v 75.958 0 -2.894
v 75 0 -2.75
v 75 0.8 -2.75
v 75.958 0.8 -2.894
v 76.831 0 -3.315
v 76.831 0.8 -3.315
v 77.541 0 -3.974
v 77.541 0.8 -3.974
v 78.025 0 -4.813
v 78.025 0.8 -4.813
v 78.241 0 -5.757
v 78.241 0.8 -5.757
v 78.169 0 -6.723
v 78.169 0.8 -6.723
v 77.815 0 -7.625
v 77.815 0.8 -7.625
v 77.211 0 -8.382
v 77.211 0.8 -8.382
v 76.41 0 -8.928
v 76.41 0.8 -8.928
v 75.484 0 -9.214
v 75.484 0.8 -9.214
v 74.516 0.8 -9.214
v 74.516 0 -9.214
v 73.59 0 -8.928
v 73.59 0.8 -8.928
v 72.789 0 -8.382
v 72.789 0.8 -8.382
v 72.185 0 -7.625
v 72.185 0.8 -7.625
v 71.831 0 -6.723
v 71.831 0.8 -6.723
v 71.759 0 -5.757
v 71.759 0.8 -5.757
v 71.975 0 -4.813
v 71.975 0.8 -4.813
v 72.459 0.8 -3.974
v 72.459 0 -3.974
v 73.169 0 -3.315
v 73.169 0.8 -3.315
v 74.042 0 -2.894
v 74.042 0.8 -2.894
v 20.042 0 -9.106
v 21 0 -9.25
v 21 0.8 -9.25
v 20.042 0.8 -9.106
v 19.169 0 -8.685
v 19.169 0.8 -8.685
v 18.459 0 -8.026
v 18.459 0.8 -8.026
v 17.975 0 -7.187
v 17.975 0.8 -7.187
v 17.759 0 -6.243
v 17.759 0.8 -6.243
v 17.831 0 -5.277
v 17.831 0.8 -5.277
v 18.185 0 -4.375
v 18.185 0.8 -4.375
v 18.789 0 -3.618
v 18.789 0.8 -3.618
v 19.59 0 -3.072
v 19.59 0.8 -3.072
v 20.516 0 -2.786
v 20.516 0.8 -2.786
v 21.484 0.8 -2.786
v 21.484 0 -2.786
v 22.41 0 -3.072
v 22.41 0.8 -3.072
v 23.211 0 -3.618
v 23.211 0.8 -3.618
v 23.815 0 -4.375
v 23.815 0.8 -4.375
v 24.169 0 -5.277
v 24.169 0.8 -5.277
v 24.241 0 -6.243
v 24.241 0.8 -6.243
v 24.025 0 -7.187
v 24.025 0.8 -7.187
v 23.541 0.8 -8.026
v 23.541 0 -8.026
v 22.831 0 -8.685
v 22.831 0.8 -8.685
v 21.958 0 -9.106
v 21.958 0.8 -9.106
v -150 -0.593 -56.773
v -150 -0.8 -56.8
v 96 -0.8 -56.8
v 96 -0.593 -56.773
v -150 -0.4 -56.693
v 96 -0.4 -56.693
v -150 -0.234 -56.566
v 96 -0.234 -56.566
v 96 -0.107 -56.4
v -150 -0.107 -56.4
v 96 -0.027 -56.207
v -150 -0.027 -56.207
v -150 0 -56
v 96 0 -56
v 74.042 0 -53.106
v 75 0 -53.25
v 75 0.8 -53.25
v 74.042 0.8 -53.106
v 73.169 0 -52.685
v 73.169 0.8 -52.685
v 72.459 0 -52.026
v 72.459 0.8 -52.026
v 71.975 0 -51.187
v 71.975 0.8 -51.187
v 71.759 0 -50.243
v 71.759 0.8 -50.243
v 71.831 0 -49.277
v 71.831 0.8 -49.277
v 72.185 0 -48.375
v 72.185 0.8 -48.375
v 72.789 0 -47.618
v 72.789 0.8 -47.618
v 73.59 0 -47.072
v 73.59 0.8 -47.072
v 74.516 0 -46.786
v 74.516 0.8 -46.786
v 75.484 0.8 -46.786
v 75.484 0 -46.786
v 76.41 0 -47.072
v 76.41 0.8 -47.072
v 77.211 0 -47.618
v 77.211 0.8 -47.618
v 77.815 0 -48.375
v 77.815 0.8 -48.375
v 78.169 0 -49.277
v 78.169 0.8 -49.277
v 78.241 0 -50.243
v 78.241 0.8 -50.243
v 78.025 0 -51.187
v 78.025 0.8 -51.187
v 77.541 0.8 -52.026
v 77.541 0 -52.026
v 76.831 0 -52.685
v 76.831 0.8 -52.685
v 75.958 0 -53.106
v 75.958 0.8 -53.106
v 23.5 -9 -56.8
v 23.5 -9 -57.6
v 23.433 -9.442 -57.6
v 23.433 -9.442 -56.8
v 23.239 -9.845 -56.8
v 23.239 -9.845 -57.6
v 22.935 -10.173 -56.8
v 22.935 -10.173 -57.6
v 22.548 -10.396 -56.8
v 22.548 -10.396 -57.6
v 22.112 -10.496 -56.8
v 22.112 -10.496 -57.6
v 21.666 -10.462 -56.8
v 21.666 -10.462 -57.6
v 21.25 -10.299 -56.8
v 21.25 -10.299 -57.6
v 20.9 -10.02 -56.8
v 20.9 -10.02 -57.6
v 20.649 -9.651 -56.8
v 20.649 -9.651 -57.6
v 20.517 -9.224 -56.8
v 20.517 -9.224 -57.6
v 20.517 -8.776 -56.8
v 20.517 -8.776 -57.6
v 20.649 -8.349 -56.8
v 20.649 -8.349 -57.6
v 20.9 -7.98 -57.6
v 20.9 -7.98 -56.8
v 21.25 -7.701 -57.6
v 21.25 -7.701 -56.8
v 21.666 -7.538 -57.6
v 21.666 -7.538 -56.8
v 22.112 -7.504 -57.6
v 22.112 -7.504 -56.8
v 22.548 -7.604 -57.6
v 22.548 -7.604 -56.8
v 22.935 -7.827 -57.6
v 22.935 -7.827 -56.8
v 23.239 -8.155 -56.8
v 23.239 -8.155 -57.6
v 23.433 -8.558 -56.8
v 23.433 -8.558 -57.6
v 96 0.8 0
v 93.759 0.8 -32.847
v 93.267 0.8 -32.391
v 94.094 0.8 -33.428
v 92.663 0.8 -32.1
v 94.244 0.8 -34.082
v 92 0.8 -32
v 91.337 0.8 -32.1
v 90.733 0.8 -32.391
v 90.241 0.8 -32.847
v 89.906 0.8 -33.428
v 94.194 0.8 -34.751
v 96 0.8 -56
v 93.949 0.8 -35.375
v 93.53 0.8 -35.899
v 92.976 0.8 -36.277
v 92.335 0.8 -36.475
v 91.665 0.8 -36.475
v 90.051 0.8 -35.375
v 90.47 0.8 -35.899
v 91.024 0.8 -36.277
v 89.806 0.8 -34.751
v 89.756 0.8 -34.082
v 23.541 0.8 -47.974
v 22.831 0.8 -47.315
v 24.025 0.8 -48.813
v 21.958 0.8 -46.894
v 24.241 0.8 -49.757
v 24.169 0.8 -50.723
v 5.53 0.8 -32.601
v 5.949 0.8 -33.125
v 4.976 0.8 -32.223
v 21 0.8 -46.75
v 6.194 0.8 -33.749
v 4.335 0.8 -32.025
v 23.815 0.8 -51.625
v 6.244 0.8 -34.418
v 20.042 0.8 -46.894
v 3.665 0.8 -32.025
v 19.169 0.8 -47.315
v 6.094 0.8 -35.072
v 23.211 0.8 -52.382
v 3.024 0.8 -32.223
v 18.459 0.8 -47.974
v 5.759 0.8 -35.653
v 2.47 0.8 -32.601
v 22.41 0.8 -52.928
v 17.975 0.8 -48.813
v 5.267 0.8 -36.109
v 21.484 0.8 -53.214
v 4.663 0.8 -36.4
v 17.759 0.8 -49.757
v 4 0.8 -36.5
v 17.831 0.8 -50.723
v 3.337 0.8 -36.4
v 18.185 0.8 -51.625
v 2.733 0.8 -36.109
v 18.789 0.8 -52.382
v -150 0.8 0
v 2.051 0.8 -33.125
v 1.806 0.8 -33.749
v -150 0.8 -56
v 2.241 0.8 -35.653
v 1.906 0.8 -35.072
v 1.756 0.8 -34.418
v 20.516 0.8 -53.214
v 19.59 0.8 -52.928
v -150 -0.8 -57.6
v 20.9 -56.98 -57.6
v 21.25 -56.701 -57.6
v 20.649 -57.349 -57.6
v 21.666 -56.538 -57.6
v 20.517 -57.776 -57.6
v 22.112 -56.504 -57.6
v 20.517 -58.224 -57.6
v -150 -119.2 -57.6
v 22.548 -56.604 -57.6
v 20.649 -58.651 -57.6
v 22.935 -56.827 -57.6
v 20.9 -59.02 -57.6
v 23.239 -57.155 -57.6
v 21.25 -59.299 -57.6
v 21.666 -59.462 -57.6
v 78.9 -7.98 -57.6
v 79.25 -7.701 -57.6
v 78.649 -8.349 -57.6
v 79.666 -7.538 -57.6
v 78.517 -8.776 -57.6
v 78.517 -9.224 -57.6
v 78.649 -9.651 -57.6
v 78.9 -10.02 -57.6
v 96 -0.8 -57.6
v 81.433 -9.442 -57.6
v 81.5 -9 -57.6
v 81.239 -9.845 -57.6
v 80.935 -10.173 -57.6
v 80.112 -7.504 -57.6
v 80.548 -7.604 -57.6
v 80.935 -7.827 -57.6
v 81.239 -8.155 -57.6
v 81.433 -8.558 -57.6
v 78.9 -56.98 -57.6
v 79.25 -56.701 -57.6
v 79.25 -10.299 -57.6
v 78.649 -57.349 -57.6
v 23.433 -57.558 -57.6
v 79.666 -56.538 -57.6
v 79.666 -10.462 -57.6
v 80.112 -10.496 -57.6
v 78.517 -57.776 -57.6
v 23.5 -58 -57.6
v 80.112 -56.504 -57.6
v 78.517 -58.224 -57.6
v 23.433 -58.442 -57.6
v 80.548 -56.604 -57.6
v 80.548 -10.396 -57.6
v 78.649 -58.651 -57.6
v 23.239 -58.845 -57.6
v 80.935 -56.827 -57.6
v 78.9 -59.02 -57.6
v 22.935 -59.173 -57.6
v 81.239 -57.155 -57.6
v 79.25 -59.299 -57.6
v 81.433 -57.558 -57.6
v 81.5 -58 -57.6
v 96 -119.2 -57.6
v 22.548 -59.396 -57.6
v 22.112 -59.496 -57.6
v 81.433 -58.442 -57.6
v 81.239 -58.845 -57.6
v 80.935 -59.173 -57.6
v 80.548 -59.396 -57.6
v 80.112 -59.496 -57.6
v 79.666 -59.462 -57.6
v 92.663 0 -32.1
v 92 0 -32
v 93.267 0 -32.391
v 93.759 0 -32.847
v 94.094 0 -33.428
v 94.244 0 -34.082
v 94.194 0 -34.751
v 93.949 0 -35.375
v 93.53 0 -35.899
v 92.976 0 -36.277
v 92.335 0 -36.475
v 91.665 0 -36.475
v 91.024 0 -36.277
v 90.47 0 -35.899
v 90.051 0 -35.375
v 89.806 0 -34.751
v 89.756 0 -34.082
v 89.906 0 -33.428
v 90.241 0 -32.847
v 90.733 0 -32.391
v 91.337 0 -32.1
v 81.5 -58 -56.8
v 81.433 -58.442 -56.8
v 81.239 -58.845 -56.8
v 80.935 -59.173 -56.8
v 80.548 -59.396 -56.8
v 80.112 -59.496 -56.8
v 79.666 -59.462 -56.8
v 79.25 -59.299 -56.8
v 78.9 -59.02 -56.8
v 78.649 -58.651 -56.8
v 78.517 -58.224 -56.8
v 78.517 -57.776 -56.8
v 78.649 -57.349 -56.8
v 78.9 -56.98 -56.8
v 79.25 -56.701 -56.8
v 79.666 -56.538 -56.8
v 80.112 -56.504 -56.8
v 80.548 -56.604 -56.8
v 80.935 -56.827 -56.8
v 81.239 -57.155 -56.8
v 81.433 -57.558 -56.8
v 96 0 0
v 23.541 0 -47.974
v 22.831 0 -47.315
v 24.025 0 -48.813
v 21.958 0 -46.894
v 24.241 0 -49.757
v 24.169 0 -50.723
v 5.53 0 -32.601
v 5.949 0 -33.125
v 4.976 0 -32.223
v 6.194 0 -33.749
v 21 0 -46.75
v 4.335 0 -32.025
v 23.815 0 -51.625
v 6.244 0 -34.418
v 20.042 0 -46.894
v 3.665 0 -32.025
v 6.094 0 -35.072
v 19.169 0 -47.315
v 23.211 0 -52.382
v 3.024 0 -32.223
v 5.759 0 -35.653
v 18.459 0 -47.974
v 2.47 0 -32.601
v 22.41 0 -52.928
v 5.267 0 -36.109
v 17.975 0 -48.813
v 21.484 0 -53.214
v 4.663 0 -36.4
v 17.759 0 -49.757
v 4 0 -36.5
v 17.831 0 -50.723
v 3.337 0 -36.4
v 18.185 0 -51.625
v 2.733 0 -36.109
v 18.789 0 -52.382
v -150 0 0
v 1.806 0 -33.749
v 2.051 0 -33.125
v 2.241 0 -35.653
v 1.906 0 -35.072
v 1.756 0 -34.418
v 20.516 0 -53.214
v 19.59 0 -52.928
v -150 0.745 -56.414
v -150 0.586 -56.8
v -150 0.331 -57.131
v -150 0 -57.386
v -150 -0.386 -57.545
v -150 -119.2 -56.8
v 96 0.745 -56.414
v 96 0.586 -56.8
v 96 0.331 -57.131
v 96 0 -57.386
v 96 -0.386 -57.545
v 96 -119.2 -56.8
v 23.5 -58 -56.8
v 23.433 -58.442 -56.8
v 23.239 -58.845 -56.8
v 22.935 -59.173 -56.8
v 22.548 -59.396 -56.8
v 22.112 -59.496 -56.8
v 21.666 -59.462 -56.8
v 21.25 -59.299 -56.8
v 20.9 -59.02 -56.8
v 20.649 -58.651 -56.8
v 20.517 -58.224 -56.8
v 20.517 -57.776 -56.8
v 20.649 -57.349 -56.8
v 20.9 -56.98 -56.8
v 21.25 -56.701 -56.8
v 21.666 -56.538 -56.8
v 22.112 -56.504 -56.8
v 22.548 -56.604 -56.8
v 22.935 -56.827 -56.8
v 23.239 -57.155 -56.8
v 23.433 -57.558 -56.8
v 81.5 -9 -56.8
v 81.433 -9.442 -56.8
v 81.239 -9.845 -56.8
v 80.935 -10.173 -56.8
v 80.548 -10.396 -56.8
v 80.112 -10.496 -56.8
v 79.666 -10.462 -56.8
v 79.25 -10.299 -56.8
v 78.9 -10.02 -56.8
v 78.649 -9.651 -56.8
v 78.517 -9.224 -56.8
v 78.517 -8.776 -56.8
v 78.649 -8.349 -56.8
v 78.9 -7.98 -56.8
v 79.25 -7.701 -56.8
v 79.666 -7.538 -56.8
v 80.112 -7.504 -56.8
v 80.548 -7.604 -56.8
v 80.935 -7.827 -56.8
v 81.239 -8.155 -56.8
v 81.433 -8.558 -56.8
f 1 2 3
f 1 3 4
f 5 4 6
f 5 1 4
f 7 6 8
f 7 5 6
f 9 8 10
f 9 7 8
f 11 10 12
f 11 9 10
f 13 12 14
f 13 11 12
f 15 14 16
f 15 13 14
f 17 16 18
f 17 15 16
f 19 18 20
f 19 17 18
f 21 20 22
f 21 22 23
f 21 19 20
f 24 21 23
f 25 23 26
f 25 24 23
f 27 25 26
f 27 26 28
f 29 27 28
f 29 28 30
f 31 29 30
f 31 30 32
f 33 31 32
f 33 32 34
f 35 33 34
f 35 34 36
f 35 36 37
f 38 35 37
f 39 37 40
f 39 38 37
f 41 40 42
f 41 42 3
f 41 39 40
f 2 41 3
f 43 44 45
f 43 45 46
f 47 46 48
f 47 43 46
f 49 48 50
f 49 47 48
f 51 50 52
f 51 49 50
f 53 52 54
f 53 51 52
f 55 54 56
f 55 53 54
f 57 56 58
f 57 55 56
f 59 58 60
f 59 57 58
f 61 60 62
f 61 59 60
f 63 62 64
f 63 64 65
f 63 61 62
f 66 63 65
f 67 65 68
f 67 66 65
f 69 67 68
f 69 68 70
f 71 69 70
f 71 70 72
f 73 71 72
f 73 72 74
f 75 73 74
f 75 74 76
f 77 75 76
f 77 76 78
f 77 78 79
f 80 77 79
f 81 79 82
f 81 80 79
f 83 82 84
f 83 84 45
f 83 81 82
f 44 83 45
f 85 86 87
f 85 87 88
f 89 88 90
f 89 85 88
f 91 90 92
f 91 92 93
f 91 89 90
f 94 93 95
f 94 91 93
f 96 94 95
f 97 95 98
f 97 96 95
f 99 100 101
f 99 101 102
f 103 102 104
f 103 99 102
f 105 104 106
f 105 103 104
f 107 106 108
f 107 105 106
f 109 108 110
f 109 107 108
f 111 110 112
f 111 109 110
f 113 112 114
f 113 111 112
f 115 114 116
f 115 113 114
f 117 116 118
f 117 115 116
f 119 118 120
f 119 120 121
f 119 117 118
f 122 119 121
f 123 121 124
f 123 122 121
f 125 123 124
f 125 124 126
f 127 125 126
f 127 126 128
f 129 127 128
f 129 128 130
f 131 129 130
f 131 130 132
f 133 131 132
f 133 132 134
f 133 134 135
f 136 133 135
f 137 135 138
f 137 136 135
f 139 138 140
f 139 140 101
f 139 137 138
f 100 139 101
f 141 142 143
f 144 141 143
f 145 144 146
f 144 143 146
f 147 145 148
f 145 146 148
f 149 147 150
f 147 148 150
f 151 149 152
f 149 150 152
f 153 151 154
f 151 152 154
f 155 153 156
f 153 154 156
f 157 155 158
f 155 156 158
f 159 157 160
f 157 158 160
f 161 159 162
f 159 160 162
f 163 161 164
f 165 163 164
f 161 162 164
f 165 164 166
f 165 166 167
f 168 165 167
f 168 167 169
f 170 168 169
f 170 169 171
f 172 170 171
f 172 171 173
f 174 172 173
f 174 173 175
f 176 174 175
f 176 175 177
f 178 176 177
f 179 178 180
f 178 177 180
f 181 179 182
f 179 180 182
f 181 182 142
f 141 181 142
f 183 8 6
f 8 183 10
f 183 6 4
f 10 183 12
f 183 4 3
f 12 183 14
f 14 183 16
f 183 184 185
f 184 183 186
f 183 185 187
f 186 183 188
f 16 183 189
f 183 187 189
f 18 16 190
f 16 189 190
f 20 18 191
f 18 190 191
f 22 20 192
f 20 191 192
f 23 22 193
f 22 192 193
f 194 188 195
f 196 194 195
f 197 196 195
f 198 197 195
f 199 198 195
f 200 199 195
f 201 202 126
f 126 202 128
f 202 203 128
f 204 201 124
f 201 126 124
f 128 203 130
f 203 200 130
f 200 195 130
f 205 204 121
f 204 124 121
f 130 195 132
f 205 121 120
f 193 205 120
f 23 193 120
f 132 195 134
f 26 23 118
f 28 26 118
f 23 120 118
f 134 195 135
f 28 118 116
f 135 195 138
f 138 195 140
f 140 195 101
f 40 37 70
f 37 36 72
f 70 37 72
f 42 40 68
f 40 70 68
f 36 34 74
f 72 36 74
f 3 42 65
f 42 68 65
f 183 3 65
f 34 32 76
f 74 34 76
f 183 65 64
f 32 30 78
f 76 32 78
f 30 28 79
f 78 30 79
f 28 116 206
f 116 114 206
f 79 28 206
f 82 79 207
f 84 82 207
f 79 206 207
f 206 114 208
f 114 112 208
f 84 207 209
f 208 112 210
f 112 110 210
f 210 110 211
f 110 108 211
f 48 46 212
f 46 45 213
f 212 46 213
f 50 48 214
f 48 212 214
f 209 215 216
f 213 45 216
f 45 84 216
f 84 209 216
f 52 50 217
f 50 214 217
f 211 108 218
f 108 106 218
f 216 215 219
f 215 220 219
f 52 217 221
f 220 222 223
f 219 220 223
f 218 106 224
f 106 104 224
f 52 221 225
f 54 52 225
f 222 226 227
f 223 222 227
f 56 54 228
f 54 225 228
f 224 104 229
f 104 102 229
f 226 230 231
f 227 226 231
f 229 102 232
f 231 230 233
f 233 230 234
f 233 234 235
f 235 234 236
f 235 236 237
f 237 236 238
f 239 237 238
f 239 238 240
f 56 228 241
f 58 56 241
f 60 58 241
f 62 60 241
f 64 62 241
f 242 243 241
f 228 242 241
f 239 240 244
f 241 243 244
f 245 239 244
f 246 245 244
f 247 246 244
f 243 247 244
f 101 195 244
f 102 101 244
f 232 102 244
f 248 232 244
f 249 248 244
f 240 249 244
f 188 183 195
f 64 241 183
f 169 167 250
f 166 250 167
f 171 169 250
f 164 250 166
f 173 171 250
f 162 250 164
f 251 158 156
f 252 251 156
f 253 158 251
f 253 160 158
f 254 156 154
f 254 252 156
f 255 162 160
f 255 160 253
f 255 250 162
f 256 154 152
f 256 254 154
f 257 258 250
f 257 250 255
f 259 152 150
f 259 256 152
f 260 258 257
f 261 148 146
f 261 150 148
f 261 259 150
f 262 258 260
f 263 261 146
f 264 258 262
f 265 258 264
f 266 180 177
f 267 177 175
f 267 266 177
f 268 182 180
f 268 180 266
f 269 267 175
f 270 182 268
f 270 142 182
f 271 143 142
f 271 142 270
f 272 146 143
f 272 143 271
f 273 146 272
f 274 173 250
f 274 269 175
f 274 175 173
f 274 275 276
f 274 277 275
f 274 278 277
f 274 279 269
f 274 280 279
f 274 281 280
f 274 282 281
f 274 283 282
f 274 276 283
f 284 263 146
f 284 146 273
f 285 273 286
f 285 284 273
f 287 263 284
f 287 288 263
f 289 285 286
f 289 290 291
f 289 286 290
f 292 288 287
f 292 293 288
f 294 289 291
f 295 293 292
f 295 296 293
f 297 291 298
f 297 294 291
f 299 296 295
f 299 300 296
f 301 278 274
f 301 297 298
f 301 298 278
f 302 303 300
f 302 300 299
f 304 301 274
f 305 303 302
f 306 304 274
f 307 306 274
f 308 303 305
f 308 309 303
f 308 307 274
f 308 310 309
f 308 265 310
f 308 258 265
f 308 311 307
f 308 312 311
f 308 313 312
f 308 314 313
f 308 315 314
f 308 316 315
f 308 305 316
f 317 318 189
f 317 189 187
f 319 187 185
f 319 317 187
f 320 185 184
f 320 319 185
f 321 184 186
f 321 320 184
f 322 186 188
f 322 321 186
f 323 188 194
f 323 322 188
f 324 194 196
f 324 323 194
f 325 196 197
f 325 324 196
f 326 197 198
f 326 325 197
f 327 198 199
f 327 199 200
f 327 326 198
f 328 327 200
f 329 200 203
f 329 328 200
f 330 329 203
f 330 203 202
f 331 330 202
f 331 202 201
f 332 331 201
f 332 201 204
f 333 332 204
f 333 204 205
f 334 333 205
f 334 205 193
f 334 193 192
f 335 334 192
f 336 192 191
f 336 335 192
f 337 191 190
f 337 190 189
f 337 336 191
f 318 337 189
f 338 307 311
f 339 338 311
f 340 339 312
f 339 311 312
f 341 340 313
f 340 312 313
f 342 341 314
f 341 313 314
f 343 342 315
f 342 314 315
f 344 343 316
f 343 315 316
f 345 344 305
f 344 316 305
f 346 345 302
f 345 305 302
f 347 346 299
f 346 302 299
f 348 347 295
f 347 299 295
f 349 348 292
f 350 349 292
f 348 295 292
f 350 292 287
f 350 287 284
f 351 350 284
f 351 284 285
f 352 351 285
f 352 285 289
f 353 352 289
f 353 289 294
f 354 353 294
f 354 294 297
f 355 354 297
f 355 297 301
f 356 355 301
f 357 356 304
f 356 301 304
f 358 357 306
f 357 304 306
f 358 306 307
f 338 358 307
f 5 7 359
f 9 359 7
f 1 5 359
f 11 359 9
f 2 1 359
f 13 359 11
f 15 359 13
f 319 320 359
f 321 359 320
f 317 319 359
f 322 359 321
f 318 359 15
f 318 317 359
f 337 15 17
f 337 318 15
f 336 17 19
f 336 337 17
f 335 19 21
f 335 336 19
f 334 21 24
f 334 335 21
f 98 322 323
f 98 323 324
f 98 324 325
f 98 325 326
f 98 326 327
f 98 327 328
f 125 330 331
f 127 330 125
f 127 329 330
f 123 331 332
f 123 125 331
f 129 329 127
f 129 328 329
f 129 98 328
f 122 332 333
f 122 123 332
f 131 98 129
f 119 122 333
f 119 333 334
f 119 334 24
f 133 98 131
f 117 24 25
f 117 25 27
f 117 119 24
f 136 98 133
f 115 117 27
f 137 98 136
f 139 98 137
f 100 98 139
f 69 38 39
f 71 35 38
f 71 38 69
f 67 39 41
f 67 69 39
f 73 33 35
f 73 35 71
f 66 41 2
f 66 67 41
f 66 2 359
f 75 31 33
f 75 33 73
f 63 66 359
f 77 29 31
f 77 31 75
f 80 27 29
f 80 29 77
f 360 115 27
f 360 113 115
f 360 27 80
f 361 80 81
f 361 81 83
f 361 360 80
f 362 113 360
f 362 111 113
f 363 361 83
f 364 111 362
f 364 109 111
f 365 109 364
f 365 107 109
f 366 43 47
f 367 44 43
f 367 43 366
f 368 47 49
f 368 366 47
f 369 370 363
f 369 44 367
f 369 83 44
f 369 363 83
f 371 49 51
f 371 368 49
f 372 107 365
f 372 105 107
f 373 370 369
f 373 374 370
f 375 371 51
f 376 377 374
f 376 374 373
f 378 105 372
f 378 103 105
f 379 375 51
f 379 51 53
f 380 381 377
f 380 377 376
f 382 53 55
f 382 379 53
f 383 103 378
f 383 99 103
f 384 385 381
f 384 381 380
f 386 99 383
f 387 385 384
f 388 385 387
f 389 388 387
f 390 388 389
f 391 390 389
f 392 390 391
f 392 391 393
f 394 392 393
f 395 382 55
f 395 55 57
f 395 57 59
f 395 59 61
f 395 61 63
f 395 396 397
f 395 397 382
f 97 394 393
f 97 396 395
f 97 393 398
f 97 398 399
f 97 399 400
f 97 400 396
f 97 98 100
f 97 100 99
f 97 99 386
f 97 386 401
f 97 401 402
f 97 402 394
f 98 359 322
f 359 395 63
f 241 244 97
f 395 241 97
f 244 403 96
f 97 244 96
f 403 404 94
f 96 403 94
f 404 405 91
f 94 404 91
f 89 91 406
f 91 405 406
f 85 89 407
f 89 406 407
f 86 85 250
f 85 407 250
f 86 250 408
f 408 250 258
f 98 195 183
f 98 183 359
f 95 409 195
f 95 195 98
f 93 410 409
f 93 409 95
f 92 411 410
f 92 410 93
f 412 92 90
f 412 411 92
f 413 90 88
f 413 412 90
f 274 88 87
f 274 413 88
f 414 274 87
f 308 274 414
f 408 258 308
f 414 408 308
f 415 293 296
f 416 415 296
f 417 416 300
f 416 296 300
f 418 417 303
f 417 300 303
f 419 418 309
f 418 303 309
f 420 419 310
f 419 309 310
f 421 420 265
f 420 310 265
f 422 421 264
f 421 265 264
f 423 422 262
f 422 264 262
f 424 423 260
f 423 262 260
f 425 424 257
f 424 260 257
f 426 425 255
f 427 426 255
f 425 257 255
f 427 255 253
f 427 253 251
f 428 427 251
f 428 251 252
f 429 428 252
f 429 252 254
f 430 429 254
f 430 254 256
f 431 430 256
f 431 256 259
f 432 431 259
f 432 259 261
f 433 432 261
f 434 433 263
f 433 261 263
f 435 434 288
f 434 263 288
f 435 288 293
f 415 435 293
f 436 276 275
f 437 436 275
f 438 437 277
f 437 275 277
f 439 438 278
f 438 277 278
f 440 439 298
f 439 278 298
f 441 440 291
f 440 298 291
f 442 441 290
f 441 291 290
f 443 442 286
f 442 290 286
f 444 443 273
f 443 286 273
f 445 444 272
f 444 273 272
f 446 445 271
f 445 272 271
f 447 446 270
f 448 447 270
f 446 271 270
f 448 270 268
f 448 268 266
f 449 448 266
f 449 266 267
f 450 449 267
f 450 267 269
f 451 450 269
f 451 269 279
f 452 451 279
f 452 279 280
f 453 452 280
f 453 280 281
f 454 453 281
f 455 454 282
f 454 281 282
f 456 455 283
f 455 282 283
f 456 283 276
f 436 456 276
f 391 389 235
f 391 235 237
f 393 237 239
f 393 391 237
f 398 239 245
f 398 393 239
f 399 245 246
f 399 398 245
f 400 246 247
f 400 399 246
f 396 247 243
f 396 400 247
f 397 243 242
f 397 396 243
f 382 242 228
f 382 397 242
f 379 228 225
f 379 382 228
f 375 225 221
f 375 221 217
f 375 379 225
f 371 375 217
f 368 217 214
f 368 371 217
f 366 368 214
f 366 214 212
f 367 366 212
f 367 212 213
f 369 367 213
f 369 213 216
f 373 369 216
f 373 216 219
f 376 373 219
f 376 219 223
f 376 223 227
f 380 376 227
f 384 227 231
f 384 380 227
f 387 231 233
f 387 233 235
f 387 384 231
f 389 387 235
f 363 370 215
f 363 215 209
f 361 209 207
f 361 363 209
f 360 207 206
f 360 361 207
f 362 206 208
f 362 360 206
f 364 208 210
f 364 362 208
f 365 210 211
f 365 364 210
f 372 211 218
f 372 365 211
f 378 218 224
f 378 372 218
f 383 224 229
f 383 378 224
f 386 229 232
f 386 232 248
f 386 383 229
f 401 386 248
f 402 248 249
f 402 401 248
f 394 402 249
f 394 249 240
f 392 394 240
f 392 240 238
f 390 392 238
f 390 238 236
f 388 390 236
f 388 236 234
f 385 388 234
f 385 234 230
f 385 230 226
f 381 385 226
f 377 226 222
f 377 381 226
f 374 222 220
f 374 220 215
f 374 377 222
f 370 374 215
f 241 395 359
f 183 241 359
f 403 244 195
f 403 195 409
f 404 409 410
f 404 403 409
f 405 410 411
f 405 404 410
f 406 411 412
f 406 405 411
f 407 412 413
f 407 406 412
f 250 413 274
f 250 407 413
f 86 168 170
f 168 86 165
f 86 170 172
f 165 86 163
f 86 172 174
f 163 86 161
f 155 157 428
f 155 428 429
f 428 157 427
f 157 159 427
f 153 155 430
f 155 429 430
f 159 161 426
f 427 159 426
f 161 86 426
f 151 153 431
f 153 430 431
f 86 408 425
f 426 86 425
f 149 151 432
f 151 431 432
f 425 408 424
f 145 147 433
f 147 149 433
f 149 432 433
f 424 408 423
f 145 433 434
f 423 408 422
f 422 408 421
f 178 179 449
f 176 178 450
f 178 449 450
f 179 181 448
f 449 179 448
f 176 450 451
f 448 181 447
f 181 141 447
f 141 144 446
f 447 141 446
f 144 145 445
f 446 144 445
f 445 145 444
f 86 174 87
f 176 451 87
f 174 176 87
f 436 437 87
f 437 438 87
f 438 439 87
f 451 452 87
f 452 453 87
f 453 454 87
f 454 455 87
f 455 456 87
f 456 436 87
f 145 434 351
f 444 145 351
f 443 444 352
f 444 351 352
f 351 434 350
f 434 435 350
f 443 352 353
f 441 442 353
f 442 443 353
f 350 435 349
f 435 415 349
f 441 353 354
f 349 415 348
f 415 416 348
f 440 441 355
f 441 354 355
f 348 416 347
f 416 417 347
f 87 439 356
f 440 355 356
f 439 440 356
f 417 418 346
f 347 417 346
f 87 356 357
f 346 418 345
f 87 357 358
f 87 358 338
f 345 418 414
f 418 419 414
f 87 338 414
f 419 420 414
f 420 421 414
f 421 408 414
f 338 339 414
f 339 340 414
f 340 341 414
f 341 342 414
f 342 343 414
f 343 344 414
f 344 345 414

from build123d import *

# Parameters (mm, degrees)
CROQUIS1_R                  = 3.25
CROQUIS1_R_2                = 2.25
SALIENTE_EXTRUIR1_DEPTH     = 0.8
BRIDA_DE_ARISTA1_DEPTH      = 246
BRIDA_START                 = 0.8
BRIDA_DE_ARISTA1_PROFILE_W  = 246
BRIDA_DE_ARISTA1_PROFILE_H  = 118.4
BRIDA_DE_ARISTA1_PROFILE_R  = 1.5
BRIDA_DE_ARISTA1_FLAT_DEPTH = 0.8


# Sheet-metal steps are written as plain solids
with BuildPart() as part:
    # Croquis1 → Saliente-Extruir1 (new body)
    with BuildSketch(Plane(origin=(0, 0, 0), x_dir=(1, 0, 0), z_dir=(0, 1, 0))):
        Polygon((0, 56), (96, 56), (96, 0), (0, 0), (-150, 0), (-150, 56), align=None)
        with Locations(Location((21, 50, 0), (0, 0, 270))):
            Circle(CROQUIS1_R, mode=Mode.SUBTRACT)
        with Locations(Location((75, 50, 0), (0, 0, 90))):
            Circle(CROQUIS1_R, mode=Mode.SUBTRACT)
        with Locations(Location((75, 6, 0), (0, 0, 270))):
            Circle(CROQUIS1_R, mode=Mode.SUBTRACT)
        with Locations(Location((21, 6, 0), (0, 0, 90))):
            Circle(CROQUIS1_R, mode=Mode.SUBTRACT)
        with Locations(Location((92, 34.25, 0), (0, 0, 270))):
            Circle(CROQUIS1_R_2, mode=Mode.SUBTRACT)
        with Locations(Location((4, 34.25, 0), (0, 0, 90))):
            Circle(CROQUIS1_R_2, mode=Mode.SUBTRACT)
    extrude(amount=SALIENTE_EXTRUIR1_DEPTH)

    # Brida de arista1 bend section (across the edge) → Brida de arista1 (add)
    with BuildSketch(Plane(origin=(-150, 0, -56.8), x_dir=(0, 0, 1), z_dir=(1, 0, 0))):
        with BuildLine():
            Line((-0.8, 0.8), (0, 0.8))
            ThreePointArc((0, 0.8), (0.234314575, 0.234314575), (0.8, 0))
            Line((0.8, 0), (0.8, -0.8))
            ThreePointArc((0.8, -0.8), (-0.33137085, -0.33137085), (-0.8, 0.8))
        make_face()
    extrude(amount=BRIDA_DE_ARISTA1_DEPTH)

    # Brida de arista1 profile (on flange) → Brida de arista1 flat (add)
    with BuildSketch(Plane(origin=(0, 0, -56.8), x_dir=(1, 0, 0), z_dir=(0, 0, -1)).offset(BRIDA_START)):
        with Locations((-27, 60)):
            Rectangle(BRIDA_DE_ARISTA1_PROFILE_W, BRIDA_DE_ARISTA1_PROFILE_H)
        with Locations((22, 9)):
            Circle(BRIDA_DE_ARISTA1_PROFILE_R, mode=Mode.SUBTRACT)
        with Locations((80, 9)):
            Circle(BRIDA_DE_ARISTA1_PROFILE_R, mode=Mode.SUBTRACT)
        with Locations((22, 58)):
            Circle(BRIDA_DE_ARISTA1_PROFILE_R, mode=Mode.SUBTRACT)
        with Locations((80, 58)):
            Circle(BRIDA_DE_ARISTA1_PROFILE_R, mode=Mode.SUBTRACT)
    extrude(amount=-BRIDA_DE_ARISTA1_FLAT_DEPTH)


solid = part.part
